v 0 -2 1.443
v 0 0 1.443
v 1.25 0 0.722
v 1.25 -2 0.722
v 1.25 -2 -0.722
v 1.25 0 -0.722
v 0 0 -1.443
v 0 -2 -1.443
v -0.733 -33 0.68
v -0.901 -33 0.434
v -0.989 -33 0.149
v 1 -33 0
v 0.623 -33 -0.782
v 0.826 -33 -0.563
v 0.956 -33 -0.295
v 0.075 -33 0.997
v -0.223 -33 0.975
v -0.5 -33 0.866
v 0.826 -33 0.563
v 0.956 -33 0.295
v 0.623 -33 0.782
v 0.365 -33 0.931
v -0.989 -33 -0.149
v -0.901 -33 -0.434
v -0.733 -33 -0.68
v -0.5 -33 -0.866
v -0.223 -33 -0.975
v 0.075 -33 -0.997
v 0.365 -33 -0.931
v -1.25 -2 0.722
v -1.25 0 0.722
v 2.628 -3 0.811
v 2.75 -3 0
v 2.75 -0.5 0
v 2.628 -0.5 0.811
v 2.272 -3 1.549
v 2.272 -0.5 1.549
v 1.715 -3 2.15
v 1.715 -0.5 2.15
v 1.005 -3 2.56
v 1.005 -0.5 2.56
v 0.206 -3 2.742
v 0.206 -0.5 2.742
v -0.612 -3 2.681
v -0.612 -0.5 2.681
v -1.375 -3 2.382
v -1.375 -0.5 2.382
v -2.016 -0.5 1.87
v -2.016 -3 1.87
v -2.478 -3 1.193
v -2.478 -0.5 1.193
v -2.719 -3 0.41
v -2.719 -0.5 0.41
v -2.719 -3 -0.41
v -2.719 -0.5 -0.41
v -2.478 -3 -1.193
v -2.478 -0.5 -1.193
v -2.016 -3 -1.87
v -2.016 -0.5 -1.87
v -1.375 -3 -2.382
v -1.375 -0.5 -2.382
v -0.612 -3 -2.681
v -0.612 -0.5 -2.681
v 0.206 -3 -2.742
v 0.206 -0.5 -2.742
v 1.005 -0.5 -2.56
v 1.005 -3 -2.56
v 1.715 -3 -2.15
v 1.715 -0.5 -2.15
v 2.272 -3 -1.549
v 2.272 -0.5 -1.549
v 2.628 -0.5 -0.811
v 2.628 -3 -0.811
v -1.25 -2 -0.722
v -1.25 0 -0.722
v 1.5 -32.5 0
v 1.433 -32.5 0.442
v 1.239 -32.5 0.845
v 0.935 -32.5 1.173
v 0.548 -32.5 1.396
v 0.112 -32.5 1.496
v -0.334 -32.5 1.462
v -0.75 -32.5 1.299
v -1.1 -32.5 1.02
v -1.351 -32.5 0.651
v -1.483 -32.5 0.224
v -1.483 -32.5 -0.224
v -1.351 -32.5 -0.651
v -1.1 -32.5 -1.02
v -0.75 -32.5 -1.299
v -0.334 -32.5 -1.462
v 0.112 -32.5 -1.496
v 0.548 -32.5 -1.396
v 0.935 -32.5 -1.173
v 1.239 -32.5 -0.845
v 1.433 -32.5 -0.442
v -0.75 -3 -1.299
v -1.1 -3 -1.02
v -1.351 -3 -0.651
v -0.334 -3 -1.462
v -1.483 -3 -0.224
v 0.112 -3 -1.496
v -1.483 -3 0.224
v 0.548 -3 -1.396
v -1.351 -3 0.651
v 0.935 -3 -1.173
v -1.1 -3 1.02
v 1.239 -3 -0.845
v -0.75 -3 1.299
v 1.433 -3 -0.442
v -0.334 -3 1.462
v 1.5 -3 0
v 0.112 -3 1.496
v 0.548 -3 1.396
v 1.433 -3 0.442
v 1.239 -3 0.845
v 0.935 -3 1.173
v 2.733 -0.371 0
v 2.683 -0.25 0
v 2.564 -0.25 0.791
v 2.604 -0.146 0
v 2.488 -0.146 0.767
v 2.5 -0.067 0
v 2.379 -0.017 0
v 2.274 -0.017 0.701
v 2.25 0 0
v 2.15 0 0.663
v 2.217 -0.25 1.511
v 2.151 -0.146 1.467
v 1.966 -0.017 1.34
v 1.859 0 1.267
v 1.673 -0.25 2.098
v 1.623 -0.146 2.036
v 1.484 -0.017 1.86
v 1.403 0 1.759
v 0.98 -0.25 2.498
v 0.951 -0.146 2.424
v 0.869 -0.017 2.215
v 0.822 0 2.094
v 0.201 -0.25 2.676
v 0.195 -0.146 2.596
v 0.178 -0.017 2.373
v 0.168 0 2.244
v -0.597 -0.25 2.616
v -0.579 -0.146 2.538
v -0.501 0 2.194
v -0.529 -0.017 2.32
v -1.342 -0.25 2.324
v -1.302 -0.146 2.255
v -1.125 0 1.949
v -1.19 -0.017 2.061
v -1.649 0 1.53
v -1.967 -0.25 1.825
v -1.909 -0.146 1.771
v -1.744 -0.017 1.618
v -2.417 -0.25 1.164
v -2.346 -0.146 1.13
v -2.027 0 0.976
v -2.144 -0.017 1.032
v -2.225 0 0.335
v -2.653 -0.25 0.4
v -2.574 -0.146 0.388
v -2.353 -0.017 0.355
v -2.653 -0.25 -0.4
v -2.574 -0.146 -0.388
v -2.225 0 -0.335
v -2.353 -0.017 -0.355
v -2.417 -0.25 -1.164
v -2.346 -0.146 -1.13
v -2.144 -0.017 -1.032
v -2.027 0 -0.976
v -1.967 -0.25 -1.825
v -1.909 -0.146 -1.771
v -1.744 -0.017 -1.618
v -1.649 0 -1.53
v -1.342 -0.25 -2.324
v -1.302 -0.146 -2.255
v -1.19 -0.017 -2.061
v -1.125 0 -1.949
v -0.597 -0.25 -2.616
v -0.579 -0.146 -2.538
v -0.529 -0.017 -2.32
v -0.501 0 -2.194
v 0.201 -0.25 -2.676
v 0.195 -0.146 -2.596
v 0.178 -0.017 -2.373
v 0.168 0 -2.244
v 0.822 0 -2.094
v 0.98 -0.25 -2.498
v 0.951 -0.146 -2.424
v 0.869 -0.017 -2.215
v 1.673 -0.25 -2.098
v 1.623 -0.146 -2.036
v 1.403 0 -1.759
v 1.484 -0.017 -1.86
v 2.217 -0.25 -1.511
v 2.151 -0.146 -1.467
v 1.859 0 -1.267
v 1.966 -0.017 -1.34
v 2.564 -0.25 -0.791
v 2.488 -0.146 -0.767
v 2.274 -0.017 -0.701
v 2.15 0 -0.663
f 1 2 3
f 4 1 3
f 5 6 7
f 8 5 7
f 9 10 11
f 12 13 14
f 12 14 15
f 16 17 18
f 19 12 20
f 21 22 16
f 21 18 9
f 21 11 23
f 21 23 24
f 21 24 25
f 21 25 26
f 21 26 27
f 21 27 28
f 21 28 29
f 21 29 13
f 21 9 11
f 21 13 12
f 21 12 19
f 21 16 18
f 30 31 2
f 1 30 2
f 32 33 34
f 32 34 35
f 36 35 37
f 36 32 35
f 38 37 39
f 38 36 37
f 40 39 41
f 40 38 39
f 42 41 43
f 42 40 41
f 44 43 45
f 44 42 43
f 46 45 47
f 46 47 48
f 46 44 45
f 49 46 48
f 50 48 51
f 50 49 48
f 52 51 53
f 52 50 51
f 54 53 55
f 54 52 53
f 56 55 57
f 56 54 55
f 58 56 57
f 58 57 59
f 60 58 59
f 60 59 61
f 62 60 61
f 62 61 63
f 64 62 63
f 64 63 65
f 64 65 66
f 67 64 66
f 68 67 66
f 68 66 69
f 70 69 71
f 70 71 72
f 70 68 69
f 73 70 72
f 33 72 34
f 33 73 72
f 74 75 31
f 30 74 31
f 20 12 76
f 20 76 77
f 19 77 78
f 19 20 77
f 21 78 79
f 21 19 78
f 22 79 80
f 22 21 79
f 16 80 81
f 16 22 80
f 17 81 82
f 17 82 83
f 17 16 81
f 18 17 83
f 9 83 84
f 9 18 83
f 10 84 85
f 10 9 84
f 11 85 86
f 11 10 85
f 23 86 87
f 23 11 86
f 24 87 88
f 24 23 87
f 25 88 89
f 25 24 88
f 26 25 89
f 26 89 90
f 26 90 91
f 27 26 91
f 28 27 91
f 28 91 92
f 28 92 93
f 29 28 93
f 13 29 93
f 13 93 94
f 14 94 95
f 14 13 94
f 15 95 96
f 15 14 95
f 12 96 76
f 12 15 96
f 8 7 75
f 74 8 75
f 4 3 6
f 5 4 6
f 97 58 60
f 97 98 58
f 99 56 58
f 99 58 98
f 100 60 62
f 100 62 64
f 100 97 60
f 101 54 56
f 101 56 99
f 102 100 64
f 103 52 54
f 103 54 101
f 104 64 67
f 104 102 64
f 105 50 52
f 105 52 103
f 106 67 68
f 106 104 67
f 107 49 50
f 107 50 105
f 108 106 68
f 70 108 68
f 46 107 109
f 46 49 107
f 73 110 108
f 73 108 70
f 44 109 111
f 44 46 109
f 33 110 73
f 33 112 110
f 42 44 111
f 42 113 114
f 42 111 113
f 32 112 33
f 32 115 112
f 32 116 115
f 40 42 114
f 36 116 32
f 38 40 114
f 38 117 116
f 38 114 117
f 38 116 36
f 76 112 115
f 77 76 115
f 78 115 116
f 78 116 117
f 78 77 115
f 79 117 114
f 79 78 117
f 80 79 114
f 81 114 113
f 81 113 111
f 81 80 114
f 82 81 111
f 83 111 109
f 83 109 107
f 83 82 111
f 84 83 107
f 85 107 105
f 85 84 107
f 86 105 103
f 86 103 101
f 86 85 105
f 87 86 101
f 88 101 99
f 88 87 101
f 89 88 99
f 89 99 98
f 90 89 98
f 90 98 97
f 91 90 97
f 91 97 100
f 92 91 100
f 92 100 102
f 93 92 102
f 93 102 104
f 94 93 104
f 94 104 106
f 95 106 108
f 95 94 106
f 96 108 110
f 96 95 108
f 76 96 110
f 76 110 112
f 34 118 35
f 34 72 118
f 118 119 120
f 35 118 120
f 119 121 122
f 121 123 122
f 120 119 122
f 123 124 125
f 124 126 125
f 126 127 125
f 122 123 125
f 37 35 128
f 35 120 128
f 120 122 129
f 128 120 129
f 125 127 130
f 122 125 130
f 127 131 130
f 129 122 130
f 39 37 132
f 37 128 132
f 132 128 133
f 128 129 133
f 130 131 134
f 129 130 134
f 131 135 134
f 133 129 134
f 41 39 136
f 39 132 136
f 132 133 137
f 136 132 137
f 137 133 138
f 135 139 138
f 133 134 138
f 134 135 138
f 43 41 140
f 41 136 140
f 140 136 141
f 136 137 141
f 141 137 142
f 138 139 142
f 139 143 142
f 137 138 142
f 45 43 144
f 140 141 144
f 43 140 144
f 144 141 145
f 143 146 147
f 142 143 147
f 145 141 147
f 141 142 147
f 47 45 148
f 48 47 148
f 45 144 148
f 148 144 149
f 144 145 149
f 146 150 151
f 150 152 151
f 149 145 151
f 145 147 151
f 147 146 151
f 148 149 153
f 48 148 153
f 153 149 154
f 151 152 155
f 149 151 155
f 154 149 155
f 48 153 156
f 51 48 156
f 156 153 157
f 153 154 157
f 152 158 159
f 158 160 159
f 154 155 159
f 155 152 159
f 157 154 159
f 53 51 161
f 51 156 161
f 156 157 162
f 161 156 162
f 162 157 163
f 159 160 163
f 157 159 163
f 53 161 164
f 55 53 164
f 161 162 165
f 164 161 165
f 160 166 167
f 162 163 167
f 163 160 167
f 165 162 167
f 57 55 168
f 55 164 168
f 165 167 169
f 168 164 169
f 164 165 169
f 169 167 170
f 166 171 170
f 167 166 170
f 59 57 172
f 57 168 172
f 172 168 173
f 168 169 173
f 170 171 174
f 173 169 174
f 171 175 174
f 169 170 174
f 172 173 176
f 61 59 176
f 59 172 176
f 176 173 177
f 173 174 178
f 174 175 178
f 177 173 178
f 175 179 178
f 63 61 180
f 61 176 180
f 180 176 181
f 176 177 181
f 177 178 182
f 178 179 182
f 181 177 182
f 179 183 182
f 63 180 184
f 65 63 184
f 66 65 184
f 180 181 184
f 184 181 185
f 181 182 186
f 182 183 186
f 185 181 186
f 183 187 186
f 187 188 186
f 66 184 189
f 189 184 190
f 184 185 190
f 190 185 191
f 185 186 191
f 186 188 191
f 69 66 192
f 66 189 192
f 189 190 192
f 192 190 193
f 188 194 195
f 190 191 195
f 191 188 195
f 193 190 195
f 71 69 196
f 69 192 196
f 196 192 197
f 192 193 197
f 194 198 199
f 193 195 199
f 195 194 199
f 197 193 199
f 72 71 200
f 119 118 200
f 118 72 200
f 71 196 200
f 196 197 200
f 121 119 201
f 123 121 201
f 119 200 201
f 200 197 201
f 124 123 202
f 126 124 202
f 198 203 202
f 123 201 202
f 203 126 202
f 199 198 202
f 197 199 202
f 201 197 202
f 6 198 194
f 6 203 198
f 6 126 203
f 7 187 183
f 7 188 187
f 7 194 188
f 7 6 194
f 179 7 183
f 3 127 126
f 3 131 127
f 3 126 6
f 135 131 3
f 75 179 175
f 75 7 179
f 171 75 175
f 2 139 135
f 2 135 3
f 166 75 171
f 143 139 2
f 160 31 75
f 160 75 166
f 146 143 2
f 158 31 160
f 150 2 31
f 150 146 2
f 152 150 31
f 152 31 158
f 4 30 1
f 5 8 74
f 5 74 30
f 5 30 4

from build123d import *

# Parameters (mm, degrees)
CORTAR_EXTRUIR1_DEPTH = 2
CHAFL_N1_SIZE         = 0.5
REDONDEO1_R           = 0.5


with BuildPart() as part:
    # Croquis1 → Revolución1 (revolve)
    with BuildSketch(Plane.XY):
        Polygon((0, 0), (2.75, 0), (2.75, -3), (1.5, -3), (1.5, -33), (0, -33), align=None)
    revolve(axis=Axis((0, 0, 0), (0, -1, 0)))

    # Croquis2 → Cortar-Extruir1 (cut)
    with BuildSketch(Plane(origin=(0, 0, 0), x_dir=(1, 0, 0), z_dir=(0, 1, 0))):
        Polygon((1.25, 0.721687836), (0, 1.443375673), (-1.25, 0.721687836), (-1.25, -0.721687836), (0, -1.443375673), (1.25, -0.721687836), align=None)
    extrude(amount=-CORTAR_EXTRUIR1_DEPTH, mode=Mode.SUBTRACT)

    # Chaflán1
    chafl_n1_edges = [part.edges().sort_by_distance(p)[0] for p in [
        (-1.5, -33, 0),
    ]]
    chamfer(chafl_n1_edges, length=CHAFL_N1_SIZE)

    # Redondeo1
    redondeo1_edges = [part.edges().sort_by_distance(p)[0] for p in [
        (-2.75, 0, 0),
    ]]
    fillet(redondeo1_edges, radius=REDONDEO1_R)


solid = part.part
